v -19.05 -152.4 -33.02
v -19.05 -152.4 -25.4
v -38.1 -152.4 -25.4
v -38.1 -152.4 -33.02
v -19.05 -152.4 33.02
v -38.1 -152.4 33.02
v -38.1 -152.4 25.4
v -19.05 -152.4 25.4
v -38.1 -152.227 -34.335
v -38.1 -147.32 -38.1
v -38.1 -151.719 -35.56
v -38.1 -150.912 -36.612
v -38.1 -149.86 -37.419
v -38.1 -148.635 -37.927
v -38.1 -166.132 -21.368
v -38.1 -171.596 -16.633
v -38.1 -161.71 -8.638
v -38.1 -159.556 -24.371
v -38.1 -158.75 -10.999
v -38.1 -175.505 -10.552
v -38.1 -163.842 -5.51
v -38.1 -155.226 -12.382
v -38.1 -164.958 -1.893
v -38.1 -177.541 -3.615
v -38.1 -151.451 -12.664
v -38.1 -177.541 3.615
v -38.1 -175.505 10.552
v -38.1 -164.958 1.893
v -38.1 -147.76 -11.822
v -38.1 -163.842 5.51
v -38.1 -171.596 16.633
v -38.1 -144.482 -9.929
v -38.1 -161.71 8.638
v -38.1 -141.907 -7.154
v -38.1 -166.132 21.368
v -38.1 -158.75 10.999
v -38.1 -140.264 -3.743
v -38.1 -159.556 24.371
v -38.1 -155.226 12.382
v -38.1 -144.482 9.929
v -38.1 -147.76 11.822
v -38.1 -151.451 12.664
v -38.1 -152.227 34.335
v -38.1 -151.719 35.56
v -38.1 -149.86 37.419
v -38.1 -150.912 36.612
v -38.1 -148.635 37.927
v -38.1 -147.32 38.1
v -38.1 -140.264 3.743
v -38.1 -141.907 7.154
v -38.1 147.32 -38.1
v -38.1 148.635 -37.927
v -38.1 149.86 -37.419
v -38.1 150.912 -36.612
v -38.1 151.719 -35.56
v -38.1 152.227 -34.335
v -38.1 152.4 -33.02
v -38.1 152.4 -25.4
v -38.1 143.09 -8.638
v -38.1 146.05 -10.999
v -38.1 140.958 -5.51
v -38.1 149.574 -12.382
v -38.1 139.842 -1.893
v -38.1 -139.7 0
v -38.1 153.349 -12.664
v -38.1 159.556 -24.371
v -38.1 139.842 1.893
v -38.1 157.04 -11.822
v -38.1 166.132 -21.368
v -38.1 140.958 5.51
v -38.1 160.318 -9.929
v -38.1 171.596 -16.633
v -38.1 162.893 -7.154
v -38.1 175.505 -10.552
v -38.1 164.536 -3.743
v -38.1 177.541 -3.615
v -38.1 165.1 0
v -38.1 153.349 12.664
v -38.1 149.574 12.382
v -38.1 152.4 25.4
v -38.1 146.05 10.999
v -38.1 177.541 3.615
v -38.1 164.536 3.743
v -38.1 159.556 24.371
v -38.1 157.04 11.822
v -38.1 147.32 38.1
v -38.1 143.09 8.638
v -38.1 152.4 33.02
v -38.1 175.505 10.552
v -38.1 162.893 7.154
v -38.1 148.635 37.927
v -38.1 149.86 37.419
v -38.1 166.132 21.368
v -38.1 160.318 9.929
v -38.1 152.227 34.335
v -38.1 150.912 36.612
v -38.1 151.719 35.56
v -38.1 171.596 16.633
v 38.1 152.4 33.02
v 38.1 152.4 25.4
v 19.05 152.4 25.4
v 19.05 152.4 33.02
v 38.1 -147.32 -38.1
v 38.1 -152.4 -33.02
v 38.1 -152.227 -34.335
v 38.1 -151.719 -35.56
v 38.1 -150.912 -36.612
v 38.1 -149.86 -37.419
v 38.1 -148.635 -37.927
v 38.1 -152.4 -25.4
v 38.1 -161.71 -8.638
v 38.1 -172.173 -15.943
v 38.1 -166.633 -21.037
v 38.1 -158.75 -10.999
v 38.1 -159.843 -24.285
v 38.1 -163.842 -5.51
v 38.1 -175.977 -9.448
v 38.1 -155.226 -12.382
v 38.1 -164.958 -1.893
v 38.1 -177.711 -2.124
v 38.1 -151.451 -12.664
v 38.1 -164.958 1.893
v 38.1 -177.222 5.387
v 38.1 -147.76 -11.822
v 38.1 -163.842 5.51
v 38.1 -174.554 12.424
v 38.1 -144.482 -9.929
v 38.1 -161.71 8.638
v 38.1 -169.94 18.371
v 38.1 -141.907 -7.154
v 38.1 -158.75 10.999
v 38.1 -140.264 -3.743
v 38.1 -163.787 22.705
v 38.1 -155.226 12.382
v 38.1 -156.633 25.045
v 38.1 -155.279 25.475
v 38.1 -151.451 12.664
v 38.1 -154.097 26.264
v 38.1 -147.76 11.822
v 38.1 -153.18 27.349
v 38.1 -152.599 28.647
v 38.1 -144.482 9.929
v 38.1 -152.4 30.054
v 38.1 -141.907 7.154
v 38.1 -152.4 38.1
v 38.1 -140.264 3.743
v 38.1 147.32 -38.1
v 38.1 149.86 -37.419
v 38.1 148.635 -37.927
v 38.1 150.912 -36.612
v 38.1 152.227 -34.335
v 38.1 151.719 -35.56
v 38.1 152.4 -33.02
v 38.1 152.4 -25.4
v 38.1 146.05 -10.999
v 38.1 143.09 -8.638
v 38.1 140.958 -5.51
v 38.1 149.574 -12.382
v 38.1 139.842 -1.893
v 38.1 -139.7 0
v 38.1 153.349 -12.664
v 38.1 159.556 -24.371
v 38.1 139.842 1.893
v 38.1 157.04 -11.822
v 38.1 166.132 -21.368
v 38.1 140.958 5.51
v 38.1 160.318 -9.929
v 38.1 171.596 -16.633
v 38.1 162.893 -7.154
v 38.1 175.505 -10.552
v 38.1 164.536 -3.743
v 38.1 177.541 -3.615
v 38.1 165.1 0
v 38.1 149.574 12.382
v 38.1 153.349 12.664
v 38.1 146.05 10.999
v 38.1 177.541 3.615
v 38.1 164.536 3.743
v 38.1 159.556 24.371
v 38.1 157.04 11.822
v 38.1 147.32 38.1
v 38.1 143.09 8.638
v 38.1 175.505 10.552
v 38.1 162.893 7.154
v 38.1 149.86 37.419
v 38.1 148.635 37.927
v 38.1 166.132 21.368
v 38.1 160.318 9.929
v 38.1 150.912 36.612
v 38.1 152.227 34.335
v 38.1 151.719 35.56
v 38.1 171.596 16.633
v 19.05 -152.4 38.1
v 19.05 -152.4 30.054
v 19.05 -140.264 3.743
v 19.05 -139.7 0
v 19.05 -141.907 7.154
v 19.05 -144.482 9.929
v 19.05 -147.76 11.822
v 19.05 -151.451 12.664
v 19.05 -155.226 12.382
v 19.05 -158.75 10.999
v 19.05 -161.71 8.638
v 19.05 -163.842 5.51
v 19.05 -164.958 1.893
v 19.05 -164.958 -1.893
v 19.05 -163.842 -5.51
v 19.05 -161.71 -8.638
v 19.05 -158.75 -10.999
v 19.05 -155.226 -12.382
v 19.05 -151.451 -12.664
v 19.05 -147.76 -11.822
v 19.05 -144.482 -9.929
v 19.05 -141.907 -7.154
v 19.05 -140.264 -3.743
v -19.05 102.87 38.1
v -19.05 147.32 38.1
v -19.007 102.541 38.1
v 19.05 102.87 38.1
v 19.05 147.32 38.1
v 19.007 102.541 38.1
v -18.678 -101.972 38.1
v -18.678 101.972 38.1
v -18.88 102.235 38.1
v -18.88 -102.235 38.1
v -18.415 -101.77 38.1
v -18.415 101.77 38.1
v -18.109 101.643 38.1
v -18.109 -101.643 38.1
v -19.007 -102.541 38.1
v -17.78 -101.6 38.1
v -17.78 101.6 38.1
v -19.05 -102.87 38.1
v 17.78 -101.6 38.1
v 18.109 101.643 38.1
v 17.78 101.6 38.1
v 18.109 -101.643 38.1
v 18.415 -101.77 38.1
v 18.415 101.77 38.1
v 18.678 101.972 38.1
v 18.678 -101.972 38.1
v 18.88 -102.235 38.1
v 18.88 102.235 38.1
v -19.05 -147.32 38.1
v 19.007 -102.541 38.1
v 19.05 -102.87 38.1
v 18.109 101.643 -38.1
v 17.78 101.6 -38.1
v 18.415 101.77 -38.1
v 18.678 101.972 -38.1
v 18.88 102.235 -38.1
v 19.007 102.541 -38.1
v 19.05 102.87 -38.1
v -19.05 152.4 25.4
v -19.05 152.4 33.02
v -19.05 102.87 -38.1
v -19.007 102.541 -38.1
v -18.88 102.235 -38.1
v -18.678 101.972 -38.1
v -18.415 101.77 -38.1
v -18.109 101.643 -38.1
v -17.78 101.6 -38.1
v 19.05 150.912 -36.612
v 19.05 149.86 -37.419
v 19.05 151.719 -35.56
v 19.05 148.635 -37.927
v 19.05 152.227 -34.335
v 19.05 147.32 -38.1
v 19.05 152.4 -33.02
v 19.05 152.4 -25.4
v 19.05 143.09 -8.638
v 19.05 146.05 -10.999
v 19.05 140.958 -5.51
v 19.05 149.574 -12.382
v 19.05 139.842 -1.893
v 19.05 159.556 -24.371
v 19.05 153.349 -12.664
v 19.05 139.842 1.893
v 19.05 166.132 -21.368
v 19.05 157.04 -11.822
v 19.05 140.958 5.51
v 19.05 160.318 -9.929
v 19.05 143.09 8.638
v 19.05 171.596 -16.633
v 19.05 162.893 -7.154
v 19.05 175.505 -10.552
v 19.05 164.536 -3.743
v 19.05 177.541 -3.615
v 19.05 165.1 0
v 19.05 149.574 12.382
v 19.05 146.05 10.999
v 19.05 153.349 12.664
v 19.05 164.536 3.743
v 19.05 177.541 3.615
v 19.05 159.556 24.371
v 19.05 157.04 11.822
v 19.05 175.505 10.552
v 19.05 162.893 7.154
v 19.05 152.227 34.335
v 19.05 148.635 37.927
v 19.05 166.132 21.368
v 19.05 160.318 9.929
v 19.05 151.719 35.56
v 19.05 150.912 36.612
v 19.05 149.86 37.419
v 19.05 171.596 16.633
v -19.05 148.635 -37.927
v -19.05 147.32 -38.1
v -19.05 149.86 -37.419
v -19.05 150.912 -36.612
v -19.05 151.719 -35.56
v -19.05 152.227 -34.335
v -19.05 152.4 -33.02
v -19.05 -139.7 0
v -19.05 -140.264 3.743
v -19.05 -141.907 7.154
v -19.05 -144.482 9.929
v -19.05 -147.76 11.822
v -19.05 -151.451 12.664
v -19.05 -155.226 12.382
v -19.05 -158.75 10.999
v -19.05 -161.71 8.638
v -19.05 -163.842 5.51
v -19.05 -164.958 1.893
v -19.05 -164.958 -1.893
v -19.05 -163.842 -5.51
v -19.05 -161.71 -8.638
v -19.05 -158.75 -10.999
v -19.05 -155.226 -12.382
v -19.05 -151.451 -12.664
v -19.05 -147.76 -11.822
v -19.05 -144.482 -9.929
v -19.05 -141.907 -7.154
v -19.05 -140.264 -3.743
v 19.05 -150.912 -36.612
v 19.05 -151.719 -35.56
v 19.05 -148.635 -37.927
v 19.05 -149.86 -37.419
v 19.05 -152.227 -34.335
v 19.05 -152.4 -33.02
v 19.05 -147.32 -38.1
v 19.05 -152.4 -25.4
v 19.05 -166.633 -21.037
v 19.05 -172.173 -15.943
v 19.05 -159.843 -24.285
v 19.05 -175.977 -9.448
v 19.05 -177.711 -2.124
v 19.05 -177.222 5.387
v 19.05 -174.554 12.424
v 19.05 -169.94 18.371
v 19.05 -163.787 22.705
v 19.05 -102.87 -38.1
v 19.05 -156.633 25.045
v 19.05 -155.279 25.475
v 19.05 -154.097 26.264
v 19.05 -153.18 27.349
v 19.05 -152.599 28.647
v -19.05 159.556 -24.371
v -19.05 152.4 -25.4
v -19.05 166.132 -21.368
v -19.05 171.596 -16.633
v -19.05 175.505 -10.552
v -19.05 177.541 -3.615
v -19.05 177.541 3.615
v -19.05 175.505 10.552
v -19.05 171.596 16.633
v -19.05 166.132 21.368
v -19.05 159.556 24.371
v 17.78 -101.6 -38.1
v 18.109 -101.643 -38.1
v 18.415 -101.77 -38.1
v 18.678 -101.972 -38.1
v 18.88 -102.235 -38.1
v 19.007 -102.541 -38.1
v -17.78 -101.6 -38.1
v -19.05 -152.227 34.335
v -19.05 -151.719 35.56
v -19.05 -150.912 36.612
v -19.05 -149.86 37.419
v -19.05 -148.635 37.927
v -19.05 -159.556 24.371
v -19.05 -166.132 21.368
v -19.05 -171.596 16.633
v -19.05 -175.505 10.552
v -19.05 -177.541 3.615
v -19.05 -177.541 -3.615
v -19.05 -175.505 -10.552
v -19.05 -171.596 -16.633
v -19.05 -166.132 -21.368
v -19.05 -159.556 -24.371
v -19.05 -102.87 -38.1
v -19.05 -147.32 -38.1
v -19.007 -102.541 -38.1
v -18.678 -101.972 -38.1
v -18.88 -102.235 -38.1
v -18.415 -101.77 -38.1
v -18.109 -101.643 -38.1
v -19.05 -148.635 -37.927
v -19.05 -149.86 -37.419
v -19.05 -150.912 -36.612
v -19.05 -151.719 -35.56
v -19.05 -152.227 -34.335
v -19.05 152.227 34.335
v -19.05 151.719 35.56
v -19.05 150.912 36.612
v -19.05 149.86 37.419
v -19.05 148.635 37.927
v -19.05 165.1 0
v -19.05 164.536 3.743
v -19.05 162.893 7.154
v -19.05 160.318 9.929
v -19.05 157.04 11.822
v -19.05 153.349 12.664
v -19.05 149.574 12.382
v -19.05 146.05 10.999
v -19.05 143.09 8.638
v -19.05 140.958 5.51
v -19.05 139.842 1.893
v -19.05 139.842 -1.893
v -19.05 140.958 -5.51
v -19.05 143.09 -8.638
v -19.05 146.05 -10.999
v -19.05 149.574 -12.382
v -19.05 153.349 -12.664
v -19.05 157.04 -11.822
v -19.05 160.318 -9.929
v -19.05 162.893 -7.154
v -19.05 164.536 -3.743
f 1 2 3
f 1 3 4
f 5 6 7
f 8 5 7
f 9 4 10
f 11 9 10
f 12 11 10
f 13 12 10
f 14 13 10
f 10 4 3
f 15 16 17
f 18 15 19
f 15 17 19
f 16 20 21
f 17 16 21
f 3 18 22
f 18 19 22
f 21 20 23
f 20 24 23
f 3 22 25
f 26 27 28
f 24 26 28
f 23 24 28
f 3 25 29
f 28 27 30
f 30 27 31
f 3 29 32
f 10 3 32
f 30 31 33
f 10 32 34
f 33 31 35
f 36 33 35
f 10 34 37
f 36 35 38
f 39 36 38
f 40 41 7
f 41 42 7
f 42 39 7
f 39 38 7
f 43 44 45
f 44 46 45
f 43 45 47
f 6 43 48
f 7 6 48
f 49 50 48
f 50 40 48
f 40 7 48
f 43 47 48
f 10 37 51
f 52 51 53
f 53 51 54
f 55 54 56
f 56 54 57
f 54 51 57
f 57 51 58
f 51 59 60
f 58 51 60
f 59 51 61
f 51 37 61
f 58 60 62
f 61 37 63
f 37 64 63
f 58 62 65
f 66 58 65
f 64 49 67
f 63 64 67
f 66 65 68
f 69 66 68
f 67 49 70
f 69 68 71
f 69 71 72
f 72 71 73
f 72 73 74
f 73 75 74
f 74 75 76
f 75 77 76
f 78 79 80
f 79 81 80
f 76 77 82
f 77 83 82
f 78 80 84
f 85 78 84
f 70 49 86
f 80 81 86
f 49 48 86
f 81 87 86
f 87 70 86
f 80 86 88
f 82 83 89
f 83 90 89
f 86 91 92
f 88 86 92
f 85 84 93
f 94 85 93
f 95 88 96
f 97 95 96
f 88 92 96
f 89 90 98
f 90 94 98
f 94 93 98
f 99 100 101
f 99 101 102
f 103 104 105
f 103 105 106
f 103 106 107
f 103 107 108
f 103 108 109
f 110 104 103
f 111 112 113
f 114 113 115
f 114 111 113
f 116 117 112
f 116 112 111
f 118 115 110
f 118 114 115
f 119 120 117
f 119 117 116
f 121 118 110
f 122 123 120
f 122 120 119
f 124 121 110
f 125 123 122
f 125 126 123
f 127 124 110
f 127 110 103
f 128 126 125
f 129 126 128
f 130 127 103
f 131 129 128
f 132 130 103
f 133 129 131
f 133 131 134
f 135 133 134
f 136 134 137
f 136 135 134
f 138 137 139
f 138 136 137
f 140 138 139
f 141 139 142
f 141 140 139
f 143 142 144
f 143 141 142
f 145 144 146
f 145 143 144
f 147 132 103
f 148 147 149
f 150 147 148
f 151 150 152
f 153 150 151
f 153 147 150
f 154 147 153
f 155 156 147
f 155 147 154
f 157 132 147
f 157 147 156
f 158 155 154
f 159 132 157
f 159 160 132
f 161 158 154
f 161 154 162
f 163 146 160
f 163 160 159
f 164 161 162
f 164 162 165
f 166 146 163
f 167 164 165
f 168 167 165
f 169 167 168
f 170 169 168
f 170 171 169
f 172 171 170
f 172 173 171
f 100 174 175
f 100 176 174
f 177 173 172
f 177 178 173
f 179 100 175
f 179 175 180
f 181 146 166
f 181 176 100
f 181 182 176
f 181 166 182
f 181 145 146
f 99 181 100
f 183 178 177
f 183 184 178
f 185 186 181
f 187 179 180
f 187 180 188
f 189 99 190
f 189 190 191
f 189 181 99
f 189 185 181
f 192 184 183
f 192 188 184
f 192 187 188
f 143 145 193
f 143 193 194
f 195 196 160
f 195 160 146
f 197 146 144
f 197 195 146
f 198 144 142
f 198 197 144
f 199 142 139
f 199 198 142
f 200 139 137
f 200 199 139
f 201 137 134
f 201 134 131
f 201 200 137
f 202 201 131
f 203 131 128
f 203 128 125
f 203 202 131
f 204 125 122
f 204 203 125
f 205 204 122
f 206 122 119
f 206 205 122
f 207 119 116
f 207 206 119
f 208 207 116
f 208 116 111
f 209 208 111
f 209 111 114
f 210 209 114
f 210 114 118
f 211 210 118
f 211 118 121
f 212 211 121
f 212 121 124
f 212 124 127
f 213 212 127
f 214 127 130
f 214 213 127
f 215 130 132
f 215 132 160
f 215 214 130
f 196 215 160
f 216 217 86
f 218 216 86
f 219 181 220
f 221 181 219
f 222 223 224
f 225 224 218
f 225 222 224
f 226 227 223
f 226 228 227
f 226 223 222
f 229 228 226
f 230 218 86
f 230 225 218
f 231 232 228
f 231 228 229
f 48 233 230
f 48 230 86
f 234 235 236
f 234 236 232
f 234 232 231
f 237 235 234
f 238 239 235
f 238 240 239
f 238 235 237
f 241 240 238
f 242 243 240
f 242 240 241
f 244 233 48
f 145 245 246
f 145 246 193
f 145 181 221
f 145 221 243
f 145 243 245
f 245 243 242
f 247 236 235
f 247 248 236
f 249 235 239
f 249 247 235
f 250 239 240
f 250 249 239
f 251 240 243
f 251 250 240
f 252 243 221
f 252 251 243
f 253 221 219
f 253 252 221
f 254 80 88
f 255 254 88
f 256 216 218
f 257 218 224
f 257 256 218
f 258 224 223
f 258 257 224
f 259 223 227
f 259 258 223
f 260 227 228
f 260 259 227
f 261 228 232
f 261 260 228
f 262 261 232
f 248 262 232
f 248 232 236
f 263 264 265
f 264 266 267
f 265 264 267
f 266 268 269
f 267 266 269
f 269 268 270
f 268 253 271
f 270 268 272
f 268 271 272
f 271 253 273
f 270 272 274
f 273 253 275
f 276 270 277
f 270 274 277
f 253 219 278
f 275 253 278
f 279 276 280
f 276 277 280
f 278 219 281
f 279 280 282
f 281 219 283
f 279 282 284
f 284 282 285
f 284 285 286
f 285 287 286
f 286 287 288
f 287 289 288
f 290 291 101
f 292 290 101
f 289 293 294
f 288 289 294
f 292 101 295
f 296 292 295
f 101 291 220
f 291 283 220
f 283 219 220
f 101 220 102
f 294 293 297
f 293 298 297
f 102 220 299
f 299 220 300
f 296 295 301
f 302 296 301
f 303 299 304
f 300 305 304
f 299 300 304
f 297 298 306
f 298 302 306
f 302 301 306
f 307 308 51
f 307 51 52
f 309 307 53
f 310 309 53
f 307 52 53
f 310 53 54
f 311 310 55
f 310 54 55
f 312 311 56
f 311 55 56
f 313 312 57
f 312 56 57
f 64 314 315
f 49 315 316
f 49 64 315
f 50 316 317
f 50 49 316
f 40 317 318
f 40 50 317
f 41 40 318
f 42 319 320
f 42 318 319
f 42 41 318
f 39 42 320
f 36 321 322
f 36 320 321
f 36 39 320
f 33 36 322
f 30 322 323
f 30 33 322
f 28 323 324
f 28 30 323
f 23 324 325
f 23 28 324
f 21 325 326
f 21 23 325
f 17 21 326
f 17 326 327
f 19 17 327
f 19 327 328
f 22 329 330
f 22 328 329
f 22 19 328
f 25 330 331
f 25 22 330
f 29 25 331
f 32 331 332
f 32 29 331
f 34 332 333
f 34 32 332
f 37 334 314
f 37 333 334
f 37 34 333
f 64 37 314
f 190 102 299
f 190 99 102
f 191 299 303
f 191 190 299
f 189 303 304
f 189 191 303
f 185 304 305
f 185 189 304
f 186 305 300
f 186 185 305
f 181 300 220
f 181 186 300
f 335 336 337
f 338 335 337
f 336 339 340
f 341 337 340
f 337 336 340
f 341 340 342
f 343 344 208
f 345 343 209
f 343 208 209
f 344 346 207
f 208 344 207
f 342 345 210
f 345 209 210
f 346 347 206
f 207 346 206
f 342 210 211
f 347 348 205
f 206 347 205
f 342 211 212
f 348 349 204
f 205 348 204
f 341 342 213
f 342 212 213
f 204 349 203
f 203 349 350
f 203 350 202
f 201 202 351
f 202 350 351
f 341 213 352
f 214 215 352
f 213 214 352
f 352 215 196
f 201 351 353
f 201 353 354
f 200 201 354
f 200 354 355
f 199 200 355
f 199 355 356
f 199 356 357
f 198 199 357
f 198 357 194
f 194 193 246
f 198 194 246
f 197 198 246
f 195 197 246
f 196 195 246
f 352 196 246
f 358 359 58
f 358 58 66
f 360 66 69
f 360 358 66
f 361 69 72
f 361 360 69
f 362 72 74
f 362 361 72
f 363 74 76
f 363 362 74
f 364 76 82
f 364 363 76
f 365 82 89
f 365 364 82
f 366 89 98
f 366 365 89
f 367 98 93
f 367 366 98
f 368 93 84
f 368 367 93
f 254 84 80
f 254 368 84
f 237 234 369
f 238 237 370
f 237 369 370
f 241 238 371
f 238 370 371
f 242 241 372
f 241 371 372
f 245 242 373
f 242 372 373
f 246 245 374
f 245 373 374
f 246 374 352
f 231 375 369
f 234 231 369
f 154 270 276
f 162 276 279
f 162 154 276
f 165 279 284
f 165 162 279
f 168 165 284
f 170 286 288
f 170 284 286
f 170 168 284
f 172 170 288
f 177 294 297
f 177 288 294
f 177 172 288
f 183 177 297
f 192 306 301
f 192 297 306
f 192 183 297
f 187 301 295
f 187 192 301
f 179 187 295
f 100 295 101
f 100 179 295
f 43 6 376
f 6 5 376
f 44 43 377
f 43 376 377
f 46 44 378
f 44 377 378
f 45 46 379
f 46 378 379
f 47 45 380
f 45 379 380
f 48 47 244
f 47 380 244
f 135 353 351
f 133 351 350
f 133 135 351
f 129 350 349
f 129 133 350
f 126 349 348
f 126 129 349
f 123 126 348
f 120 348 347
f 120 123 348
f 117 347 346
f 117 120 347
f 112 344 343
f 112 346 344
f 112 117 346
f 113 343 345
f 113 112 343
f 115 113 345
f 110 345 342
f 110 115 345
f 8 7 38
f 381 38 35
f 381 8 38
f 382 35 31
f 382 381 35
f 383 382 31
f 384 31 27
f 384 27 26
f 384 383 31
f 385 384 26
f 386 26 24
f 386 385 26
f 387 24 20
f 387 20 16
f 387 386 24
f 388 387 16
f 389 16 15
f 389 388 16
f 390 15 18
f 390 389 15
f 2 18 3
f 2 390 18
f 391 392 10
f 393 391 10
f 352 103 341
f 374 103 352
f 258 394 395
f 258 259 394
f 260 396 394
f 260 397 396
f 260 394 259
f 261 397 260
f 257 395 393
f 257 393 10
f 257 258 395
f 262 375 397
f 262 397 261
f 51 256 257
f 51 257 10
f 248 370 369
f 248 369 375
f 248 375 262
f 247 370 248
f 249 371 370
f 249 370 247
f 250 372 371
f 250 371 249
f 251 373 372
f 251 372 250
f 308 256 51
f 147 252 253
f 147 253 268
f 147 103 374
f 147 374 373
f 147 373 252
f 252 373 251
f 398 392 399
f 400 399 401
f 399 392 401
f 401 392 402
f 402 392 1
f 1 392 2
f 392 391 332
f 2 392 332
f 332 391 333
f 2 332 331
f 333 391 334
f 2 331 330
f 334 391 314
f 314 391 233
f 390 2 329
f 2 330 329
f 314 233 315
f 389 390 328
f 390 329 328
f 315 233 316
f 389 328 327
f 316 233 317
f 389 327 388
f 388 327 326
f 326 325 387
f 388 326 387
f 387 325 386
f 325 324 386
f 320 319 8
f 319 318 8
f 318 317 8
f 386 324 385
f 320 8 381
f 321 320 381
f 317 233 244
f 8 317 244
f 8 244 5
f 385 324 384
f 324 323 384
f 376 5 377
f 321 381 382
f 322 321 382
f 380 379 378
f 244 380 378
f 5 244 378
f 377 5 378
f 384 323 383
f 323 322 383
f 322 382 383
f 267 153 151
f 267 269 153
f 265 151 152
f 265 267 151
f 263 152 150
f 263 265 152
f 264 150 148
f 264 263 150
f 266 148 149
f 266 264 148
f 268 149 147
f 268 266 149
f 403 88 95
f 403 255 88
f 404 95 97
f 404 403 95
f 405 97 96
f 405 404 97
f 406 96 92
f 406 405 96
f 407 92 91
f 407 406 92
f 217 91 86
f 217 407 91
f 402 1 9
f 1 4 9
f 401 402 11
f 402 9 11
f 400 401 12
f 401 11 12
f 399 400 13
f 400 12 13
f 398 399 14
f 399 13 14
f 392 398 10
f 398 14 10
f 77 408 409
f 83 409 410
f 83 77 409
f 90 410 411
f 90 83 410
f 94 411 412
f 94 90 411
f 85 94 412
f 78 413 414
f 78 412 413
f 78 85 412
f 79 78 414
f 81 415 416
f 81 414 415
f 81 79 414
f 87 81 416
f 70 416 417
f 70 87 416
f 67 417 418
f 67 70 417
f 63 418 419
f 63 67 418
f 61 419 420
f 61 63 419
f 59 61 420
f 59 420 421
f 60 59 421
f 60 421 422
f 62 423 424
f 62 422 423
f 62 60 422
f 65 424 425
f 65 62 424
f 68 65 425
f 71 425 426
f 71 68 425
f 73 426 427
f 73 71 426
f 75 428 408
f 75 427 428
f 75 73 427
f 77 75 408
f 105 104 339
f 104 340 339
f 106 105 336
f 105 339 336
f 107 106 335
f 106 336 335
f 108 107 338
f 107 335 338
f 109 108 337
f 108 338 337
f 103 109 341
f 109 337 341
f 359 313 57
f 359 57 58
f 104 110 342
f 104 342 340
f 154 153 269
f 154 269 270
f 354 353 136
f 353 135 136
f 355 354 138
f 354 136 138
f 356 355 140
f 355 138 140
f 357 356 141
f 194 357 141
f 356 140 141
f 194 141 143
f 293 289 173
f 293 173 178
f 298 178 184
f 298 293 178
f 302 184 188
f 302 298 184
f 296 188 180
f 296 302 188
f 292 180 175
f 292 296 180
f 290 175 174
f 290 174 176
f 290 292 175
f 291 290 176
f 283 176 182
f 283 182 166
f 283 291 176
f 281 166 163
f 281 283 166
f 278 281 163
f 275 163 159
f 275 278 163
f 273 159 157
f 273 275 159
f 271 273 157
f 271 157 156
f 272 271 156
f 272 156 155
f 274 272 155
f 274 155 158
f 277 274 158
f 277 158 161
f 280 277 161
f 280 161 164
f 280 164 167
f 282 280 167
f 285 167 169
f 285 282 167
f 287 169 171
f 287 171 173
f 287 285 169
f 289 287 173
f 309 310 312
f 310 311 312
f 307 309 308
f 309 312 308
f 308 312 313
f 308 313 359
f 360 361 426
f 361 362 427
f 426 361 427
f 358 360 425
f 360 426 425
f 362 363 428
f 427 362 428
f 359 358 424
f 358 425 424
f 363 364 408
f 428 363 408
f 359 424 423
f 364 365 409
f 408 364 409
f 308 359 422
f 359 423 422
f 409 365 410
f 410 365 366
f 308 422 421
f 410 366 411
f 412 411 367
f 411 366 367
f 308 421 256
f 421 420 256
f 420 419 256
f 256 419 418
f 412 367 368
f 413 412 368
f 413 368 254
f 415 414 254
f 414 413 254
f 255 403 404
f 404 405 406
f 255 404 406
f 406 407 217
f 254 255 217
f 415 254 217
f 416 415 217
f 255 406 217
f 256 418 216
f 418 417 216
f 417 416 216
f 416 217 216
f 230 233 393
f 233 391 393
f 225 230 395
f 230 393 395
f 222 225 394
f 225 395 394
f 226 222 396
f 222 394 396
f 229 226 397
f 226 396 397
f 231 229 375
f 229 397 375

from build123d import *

# Parameters (mm, degrees)
F0_R     = 12.7
F1_DEPTH = 38.1
F2_W     = 38.1
F2_H     = 25.4
F2_H_2   = 50.8
F3_DEPTH = 88.9
F4_R     = 5.08
F5_R     = 1.27


with BuildPart() as f1:
    # F0 (on Right) → F1 (new body, symmetric)
    with BuildSketch(Plane.YZ):
        with BuildLine():
            Line((152.4, 25.4), (152.4, 38.1))
            Line((152.4, 38.1), (-152.4, 38.1))
            Line((-152.4, 38.1), (-152.4, 25.4))
            ThreePointArc((-152.4, 25.4), (-177.8, 0), (-152.4, -25.4))
            Line((-152.4, -25.4), (-152.4, -38.1))
            Line((-152.4, -38.1), (152.4, -38.1))
            Line((152.4, -38.1), (152.4, -25.4))
            ThreePointArc((152.4, -25.4), (177.8, 0), (152.4, 25.4))
        make_face()
        with Locations((-152.4, 0)):
            Circle(F0_R, mode=Mode.SUBTRACT)
        with Locations((152.4, 0)):
            Circle(F0_R, mode=Mode.SUBTRACT)
    extrude(amount=F1_DEPTH, both=True)

    # F2 (on face) → F3 (cut)
    with BuildSketch(Plane.XY.offset(38.1)):
        with Locations((0, 165.1)):
            Rectangle(F2_W, F2_H)
        with Locations((0, 127)):
            Rectangle(F2_W, F2_H_2)
        with Locations((0, -127)):
            Rectangle(F2_W, F2_H_2)
        with Locations((0, -165.1)):
            Rectangle(F2_W, F2_H)
    extrude(amount=-F3_DEPTH, mode=Mode.SUBTRACT)

    # F4
    f4_edges = [f1.edges().sort_by_distance(p)[0] for p in [
        (28.575, 152.4, -38.1),
        (-28.575, 152.4, -38.1),
        (-28.575, 152.4, 38.1),
        (28.575, 152.4, 38.1),
        (28.575, -152.4, -38.1),
        (-28.575, -152.4, -38.1),
        (28.575, -152.4, 25.4),
        (-28.575, -152.4, 38.1),
    ]]
    fillet(f4_edges, radius=F4_R)

    # F5
    f5_edges = [f1.edges().sort_by_distance(p)[0] for p in [
        (19.05, 101.6, 0),
        (-19.05, 101.6, 0),
        (19.05, -101.6, 0),
        (-19.05, -101.6, 0),
    ]]
    fillet(f5_edges, radius=F5_R)


solid = f1.part
